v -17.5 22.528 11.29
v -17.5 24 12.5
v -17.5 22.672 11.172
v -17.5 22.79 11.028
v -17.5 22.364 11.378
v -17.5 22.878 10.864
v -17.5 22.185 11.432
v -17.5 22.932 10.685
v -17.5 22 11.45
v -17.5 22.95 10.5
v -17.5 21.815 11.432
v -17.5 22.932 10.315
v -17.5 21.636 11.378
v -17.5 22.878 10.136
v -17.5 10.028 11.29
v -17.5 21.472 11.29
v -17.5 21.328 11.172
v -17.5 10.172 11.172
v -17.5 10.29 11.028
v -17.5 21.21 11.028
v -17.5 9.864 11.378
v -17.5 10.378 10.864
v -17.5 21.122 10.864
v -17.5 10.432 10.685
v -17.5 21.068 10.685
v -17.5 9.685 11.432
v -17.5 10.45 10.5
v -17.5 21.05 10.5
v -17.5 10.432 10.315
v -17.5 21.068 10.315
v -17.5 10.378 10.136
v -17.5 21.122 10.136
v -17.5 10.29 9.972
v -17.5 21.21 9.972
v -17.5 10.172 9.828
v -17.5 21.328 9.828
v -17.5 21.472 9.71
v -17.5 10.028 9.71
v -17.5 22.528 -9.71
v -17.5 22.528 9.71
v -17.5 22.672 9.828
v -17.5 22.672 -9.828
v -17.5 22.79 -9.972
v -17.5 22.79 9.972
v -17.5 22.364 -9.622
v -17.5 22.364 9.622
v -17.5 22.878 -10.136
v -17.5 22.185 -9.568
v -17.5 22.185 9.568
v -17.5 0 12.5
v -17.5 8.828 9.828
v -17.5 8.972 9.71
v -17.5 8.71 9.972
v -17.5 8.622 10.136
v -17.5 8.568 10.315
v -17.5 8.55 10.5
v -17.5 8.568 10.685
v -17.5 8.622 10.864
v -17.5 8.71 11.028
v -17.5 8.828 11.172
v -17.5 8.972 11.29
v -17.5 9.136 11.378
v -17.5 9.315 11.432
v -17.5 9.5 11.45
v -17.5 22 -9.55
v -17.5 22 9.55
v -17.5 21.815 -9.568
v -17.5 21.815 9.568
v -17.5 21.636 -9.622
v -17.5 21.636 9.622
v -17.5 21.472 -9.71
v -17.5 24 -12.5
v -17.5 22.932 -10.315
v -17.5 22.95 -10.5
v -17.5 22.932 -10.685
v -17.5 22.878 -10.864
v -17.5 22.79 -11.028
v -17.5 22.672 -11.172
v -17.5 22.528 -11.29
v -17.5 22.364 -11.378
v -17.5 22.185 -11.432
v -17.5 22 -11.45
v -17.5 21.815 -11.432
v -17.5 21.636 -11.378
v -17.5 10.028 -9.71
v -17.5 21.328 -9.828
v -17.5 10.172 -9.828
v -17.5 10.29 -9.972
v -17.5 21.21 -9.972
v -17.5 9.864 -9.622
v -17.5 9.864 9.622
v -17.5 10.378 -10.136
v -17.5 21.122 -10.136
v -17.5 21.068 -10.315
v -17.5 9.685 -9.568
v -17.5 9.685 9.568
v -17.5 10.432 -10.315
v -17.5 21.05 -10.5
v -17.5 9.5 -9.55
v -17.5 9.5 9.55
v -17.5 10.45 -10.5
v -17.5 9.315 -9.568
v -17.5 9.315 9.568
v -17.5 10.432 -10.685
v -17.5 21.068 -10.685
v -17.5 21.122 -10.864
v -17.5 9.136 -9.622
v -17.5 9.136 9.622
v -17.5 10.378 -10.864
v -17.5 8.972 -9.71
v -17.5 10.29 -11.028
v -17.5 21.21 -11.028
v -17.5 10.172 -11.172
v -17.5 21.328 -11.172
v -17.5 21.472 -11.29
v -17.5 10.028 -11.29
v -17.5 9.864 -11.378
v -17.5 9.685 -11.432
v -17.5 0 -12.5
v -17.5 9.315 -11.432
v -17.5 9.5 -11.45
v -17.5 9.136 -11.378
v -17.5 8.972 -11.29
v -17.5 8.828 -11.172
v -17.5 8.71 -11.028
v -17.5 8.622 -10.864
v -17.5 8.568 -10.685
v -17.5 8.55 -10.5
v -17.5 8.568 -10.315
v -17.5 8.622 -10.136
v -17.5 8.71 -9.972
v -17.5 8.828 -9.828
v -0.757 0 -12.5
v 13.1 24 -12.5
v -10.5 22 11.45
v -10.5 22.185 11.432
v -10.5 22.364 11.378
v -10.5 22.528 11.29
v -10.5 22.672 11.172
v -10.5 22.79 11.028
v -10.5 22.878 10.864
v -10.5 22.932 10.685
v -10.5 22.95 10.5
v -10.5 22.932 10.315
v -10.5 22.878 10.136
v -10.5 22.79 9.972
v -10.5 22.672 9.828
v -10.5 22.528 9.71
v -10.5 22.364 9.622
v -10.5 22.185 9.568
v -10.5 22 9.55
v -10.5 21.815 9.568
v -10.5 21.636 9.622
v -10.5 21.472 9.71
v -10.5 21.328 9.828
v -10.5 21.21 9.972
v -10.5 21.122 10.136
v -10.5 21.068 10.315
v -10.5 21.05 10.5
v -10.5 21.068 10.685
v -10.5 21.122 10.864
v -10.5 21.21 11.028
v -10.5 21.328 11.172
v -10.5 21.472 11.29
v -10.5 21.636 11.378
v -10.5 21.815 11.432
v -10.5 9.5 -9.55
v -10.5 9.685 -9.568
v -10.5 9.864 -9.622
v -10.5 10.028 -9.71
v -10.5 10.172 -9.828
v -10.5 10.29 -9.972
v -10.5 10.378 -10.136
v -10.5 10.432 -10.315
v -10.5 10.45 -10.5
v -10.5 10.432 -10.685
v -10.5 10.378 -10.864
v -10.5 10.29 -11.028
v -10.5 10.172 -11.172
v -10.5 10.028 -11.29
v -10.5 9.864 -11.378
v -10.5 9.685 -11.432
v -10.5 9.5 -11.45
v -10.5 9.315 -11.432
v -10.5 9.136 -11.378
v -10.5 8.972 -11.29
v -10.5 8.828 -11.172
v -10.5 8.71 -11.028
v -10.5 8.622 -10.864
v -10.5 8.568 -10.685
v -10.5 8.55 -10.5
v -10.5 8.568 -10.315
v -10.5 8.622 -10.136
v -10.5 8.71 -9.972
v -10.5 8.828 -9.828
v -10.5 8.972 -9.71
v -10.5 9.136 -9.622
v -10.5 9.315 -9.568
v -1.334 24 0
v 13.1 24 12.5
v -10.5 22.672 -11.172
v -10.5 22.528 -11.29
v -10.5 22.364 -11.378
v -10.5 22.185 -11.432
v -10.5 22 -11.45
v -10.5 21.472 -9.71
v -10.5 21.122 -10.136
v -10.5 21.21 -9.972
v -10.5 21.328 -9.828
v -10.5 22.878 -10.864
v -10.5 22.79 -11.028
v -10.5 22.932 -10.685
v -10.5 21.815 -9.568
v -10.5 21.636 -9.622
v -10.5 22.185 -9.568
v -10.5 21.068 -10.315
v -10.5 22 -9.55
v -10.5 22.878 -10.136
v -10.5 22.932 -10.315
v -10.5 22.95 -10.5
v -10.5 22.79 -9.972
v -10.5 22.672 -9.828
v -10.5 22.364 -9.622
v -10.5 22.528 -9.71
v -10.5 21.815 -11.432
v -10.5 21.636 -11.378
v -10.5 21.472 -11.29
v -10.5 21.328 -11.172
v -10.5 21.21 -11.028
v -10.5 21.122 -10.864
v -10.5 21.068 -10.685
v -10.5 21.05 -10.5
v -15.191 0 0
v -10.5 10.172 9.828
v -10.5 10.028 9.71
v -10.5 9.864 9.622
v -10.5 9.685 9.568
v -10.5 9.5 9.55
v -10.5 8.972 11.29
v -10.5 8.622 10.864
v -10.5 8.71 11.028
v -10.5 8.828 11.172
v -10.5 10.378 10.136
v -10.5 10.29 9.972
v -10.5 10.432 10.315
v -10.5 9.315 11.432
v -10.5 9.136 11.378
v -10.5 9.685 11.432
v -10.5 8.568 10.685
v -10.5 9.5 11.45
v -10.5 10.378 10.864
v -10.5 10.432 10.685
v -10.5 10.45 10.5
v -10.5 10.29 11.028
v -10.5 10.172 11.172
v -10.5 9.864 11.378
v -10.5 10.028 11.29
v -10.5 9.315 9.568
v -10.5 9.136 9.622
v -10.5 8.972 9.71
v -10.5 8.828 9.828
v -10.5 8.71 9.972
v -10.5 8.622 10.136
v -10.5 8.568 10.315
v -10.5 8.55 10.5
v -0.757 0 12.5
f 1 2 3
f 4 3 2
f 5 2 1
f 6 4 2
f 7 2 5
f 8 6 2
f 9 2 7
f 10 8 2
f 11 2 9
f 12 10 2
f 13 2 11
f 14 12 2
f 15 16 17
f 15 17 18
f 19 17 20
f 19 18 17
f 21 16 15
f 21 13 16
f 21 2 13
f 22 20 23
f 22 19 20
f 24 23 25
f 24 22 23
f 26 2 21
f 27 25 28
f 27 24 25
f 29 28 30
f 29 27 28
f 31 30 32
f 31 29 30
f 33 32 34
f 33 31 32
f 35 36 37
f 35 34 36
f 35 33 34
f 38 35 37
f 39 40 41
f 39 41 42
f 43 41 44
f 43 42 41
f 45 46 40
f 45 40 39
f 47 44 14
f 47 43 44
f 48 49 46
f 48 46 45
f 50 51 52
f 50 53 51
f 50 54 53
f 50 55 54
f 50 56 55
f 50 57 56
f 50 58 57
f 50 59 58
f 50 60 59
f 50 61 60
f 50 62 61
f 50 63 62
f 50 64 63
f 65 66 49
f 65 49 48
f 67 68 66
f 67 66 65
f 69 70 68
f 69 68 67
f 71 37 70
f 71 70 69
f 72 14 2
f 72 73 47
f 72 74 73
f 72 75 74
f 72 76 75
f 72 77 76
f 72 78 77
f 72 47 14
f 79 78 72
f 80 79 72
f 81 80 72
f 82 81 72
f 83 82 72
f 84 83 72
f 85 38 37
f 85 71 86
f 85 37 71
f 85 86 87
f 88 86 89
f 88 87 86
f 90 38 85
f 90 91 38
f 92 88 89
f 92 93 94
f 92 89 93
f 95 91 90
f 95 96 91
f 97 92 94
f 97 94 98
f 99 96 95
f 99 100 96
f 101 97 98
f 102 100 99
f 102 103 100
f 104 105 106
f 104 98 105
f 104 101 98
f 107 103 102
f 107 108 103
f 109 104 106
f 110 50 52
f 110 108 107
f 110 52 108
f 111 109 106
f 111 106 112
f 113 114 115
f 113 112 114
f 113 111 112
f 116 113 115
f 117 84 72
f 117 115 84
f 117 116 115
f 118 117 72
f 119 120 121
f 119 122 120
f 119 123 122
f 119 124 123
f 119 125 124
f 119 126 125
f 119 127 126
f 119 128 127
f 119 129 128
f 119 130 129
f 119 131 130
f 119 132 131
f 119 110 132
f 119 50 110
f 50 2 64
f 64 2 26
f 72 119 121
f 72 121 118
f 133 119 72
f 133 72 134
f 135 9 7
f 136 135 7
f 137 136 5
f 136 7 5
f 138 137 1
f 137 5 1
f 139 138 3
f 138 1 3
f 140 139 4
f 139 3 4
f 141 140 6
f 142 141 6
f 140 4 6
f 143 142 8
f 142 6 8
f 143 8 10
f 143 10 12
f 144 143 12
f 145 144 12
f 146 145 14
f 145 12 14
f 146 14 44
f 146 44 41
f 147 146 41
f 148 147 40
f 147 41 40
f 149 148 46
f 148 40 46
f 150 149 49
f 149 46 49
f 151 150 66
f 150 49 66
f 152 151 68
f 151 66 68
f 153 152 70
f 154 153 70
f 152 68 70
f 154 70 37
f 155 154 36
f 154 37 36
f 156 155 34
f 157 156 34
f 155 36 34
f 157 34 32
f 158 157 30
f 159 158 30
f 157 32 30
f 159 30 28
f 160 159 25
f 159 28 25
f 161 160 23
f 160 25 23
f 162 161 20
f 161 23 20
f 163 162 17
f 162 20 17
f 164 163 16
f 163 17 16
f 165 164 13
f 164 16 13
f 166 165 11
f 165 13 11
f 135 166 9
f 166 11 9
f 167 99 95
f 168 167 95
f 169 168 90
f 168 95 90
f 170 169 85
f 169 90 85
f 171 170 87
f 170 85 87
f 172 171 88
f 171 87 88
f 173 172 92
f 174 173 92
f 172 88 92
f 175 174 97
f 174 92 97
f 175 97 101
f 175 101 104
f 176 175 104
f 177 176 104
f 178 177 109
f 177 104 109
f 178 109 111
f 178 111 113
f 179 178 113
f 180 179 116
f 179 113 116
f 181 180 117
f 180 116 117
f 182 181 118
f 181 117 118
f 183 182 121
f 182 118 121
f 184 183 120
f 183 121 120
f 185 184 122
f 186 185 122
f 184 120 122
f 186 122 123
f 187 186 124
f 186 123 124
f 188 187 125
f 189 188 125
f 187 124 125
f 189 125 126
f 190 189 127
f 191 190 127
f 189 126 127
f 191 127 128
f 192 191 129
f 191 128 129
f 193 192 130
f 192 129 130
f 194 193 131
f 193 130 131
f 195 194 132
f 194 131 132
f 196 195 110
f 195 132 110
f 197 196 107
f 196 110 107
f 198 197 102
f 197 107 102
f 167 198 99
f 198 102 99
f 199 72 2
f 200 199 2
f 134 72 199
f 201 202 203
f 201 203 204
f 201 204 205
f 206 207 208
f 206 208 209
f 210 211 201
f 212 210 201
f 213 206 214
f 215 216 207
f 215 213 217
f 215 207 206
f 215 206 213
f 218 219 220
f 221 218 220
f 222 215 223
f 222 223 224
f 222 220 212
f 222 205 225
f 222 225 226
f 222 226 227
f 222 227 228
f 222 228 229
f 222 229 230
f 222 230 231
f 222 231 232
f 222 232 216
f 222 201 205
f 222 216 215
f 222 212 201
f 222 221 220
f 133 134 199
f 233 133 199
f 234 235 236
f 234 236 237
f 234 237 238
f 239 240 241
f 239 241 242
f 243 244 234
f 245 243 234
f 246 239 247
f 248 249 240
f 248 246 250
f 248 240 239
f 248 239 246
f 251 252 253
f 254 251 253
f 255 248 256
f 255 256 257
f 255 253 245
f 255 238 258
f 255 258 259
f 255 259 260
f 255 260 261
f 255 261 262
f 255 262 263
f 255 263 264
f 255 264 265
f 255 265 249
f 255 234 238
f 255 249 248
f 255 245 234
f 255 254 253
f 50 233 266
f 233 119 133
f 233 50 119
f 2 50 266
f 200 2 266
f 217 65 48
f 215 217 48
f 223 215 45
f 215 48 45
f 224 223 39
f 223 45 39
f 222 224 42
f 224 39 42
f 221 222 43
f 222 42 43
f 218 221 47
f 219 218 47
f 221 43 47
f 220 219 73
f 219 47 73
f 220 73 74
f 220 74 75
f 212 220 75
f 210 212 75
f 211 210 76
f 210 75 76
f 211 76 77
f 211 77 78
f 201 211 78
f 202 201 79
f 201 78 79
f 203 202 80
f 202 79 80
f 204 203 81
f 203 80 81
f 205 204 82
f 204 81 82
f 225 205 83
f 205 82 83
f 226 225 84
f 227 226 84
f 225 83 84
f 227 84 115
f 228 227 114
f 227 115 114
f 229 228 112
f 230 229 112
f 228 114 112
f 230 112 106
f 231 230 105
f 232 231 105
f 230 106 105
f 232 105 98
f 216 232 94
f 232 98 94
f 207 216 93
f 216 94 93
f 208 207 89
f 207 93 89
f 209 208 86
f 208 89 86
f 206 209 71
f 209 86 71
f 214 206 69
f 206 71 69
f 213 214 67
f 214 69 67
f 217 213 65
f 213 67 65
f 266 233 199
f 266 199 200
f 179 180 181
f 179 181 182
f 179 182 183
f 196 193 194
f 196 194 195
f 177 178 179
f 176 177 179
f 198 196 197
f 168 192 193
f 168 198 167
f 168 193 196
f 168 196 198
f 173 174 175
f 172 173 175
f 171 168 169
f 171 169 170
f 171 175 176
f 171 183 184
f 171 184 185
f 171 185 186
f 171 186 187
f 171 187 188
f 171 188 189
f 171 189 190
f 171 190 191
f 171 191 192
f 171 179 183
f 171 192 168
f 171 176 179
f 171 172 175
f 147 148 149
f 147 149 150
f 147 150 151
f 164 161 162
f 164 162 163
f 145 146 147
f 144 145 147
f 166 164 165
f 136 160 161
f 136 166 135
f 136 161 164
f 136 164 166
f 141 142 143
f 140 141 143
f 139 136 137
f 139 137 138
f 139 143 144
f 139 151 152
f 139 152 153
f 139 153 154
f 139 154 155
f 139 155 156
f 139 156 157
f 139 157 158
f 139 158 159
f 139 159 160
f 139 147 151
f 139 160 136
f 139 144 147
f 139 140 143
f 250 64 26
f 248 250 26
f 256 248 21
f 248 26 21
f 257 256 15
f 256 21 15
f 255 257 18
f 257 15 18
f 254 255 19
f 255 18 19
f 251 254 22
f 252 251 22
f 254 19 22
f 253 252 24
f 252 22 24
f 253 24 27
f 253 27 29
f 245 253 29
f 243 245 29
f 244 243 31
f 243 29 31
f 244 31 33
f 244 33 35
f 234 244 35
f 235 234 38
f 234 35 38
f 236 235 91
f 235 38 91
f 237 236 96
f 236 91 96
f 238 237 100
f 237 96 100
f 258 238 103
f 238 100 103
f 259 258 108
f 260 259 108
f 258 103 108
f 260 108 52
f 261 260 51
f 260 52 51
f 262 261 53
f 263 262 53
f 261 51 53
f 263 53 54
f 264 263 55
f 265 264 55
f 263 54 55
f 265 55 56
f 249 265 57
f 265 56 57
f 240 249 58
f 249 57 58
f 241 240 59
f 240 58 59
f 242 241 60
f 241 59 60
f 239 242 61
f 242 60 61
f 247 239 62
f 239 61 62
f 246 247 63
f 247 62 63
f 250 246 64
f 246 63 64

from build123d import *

# Parameters (mm, degrees)
SKETCH1_W           = 35
SKETCH1_H           = 25
BOSS_EXTRUDE1_DEPTH = 24
CUT_EXTRUDE1_DEPTH  = 41.397006939
SKETCH5_R           = 0.95
CUT_EXTRUDE2_DEPTH  = 7


with BuildPart() as part:
    # Sketch1 → Boss-Extrude1 (new body)
    with BuildSketch(Plane(origin=(0, 0, 0), x_dir=(1, 0, 0), z_dir=(0, 1, 0))):
        Rectangle(SKETCH1_W, SKETCH1_H)
    extrude(amount=BOSS_EXTRUDE1_DEPTH)

    # Sketch4 → Cut-Extrude1 (cut, through all)
    with BuildSketch(Plane(origin=(-4.375, -7.577722283, 0), x_dir=(-0.8660254037844417, 0.49999999999999495, 0), z_dir=(-0.49999999999999495, -0.8660254037844417, 0))):
        Polygon((-7.25, 20.405444566), (13.155444566, 0), (-7.25, -20.405444566), (-27.655444566, 0), align=None)
    extrude(amount=-CUT_EXTRUDE1_DEPTH, mode=Mode.SUBTRACT)

    # Sketch5 → Cut-Extrude2 (cut)
    with BuildSketch(Plane.ZY.offset(17.5)):
        with Locations((-10.5, 22)):
            Circle(SKETCH5_R)
        with Locations((10.5, 22)):
            Circle(SKETCH5_R)
        with Locations((10.5, 9.5)):
            Circle(SKETCH5_R)
        with Locations((-10.5, 9.5)):
            Circle(SKETCH5_R)
    extrude(amount=-CUT_EXTRUDE2_DEPTH, mode=Mode.SUBTRACT)


solid = part.part
